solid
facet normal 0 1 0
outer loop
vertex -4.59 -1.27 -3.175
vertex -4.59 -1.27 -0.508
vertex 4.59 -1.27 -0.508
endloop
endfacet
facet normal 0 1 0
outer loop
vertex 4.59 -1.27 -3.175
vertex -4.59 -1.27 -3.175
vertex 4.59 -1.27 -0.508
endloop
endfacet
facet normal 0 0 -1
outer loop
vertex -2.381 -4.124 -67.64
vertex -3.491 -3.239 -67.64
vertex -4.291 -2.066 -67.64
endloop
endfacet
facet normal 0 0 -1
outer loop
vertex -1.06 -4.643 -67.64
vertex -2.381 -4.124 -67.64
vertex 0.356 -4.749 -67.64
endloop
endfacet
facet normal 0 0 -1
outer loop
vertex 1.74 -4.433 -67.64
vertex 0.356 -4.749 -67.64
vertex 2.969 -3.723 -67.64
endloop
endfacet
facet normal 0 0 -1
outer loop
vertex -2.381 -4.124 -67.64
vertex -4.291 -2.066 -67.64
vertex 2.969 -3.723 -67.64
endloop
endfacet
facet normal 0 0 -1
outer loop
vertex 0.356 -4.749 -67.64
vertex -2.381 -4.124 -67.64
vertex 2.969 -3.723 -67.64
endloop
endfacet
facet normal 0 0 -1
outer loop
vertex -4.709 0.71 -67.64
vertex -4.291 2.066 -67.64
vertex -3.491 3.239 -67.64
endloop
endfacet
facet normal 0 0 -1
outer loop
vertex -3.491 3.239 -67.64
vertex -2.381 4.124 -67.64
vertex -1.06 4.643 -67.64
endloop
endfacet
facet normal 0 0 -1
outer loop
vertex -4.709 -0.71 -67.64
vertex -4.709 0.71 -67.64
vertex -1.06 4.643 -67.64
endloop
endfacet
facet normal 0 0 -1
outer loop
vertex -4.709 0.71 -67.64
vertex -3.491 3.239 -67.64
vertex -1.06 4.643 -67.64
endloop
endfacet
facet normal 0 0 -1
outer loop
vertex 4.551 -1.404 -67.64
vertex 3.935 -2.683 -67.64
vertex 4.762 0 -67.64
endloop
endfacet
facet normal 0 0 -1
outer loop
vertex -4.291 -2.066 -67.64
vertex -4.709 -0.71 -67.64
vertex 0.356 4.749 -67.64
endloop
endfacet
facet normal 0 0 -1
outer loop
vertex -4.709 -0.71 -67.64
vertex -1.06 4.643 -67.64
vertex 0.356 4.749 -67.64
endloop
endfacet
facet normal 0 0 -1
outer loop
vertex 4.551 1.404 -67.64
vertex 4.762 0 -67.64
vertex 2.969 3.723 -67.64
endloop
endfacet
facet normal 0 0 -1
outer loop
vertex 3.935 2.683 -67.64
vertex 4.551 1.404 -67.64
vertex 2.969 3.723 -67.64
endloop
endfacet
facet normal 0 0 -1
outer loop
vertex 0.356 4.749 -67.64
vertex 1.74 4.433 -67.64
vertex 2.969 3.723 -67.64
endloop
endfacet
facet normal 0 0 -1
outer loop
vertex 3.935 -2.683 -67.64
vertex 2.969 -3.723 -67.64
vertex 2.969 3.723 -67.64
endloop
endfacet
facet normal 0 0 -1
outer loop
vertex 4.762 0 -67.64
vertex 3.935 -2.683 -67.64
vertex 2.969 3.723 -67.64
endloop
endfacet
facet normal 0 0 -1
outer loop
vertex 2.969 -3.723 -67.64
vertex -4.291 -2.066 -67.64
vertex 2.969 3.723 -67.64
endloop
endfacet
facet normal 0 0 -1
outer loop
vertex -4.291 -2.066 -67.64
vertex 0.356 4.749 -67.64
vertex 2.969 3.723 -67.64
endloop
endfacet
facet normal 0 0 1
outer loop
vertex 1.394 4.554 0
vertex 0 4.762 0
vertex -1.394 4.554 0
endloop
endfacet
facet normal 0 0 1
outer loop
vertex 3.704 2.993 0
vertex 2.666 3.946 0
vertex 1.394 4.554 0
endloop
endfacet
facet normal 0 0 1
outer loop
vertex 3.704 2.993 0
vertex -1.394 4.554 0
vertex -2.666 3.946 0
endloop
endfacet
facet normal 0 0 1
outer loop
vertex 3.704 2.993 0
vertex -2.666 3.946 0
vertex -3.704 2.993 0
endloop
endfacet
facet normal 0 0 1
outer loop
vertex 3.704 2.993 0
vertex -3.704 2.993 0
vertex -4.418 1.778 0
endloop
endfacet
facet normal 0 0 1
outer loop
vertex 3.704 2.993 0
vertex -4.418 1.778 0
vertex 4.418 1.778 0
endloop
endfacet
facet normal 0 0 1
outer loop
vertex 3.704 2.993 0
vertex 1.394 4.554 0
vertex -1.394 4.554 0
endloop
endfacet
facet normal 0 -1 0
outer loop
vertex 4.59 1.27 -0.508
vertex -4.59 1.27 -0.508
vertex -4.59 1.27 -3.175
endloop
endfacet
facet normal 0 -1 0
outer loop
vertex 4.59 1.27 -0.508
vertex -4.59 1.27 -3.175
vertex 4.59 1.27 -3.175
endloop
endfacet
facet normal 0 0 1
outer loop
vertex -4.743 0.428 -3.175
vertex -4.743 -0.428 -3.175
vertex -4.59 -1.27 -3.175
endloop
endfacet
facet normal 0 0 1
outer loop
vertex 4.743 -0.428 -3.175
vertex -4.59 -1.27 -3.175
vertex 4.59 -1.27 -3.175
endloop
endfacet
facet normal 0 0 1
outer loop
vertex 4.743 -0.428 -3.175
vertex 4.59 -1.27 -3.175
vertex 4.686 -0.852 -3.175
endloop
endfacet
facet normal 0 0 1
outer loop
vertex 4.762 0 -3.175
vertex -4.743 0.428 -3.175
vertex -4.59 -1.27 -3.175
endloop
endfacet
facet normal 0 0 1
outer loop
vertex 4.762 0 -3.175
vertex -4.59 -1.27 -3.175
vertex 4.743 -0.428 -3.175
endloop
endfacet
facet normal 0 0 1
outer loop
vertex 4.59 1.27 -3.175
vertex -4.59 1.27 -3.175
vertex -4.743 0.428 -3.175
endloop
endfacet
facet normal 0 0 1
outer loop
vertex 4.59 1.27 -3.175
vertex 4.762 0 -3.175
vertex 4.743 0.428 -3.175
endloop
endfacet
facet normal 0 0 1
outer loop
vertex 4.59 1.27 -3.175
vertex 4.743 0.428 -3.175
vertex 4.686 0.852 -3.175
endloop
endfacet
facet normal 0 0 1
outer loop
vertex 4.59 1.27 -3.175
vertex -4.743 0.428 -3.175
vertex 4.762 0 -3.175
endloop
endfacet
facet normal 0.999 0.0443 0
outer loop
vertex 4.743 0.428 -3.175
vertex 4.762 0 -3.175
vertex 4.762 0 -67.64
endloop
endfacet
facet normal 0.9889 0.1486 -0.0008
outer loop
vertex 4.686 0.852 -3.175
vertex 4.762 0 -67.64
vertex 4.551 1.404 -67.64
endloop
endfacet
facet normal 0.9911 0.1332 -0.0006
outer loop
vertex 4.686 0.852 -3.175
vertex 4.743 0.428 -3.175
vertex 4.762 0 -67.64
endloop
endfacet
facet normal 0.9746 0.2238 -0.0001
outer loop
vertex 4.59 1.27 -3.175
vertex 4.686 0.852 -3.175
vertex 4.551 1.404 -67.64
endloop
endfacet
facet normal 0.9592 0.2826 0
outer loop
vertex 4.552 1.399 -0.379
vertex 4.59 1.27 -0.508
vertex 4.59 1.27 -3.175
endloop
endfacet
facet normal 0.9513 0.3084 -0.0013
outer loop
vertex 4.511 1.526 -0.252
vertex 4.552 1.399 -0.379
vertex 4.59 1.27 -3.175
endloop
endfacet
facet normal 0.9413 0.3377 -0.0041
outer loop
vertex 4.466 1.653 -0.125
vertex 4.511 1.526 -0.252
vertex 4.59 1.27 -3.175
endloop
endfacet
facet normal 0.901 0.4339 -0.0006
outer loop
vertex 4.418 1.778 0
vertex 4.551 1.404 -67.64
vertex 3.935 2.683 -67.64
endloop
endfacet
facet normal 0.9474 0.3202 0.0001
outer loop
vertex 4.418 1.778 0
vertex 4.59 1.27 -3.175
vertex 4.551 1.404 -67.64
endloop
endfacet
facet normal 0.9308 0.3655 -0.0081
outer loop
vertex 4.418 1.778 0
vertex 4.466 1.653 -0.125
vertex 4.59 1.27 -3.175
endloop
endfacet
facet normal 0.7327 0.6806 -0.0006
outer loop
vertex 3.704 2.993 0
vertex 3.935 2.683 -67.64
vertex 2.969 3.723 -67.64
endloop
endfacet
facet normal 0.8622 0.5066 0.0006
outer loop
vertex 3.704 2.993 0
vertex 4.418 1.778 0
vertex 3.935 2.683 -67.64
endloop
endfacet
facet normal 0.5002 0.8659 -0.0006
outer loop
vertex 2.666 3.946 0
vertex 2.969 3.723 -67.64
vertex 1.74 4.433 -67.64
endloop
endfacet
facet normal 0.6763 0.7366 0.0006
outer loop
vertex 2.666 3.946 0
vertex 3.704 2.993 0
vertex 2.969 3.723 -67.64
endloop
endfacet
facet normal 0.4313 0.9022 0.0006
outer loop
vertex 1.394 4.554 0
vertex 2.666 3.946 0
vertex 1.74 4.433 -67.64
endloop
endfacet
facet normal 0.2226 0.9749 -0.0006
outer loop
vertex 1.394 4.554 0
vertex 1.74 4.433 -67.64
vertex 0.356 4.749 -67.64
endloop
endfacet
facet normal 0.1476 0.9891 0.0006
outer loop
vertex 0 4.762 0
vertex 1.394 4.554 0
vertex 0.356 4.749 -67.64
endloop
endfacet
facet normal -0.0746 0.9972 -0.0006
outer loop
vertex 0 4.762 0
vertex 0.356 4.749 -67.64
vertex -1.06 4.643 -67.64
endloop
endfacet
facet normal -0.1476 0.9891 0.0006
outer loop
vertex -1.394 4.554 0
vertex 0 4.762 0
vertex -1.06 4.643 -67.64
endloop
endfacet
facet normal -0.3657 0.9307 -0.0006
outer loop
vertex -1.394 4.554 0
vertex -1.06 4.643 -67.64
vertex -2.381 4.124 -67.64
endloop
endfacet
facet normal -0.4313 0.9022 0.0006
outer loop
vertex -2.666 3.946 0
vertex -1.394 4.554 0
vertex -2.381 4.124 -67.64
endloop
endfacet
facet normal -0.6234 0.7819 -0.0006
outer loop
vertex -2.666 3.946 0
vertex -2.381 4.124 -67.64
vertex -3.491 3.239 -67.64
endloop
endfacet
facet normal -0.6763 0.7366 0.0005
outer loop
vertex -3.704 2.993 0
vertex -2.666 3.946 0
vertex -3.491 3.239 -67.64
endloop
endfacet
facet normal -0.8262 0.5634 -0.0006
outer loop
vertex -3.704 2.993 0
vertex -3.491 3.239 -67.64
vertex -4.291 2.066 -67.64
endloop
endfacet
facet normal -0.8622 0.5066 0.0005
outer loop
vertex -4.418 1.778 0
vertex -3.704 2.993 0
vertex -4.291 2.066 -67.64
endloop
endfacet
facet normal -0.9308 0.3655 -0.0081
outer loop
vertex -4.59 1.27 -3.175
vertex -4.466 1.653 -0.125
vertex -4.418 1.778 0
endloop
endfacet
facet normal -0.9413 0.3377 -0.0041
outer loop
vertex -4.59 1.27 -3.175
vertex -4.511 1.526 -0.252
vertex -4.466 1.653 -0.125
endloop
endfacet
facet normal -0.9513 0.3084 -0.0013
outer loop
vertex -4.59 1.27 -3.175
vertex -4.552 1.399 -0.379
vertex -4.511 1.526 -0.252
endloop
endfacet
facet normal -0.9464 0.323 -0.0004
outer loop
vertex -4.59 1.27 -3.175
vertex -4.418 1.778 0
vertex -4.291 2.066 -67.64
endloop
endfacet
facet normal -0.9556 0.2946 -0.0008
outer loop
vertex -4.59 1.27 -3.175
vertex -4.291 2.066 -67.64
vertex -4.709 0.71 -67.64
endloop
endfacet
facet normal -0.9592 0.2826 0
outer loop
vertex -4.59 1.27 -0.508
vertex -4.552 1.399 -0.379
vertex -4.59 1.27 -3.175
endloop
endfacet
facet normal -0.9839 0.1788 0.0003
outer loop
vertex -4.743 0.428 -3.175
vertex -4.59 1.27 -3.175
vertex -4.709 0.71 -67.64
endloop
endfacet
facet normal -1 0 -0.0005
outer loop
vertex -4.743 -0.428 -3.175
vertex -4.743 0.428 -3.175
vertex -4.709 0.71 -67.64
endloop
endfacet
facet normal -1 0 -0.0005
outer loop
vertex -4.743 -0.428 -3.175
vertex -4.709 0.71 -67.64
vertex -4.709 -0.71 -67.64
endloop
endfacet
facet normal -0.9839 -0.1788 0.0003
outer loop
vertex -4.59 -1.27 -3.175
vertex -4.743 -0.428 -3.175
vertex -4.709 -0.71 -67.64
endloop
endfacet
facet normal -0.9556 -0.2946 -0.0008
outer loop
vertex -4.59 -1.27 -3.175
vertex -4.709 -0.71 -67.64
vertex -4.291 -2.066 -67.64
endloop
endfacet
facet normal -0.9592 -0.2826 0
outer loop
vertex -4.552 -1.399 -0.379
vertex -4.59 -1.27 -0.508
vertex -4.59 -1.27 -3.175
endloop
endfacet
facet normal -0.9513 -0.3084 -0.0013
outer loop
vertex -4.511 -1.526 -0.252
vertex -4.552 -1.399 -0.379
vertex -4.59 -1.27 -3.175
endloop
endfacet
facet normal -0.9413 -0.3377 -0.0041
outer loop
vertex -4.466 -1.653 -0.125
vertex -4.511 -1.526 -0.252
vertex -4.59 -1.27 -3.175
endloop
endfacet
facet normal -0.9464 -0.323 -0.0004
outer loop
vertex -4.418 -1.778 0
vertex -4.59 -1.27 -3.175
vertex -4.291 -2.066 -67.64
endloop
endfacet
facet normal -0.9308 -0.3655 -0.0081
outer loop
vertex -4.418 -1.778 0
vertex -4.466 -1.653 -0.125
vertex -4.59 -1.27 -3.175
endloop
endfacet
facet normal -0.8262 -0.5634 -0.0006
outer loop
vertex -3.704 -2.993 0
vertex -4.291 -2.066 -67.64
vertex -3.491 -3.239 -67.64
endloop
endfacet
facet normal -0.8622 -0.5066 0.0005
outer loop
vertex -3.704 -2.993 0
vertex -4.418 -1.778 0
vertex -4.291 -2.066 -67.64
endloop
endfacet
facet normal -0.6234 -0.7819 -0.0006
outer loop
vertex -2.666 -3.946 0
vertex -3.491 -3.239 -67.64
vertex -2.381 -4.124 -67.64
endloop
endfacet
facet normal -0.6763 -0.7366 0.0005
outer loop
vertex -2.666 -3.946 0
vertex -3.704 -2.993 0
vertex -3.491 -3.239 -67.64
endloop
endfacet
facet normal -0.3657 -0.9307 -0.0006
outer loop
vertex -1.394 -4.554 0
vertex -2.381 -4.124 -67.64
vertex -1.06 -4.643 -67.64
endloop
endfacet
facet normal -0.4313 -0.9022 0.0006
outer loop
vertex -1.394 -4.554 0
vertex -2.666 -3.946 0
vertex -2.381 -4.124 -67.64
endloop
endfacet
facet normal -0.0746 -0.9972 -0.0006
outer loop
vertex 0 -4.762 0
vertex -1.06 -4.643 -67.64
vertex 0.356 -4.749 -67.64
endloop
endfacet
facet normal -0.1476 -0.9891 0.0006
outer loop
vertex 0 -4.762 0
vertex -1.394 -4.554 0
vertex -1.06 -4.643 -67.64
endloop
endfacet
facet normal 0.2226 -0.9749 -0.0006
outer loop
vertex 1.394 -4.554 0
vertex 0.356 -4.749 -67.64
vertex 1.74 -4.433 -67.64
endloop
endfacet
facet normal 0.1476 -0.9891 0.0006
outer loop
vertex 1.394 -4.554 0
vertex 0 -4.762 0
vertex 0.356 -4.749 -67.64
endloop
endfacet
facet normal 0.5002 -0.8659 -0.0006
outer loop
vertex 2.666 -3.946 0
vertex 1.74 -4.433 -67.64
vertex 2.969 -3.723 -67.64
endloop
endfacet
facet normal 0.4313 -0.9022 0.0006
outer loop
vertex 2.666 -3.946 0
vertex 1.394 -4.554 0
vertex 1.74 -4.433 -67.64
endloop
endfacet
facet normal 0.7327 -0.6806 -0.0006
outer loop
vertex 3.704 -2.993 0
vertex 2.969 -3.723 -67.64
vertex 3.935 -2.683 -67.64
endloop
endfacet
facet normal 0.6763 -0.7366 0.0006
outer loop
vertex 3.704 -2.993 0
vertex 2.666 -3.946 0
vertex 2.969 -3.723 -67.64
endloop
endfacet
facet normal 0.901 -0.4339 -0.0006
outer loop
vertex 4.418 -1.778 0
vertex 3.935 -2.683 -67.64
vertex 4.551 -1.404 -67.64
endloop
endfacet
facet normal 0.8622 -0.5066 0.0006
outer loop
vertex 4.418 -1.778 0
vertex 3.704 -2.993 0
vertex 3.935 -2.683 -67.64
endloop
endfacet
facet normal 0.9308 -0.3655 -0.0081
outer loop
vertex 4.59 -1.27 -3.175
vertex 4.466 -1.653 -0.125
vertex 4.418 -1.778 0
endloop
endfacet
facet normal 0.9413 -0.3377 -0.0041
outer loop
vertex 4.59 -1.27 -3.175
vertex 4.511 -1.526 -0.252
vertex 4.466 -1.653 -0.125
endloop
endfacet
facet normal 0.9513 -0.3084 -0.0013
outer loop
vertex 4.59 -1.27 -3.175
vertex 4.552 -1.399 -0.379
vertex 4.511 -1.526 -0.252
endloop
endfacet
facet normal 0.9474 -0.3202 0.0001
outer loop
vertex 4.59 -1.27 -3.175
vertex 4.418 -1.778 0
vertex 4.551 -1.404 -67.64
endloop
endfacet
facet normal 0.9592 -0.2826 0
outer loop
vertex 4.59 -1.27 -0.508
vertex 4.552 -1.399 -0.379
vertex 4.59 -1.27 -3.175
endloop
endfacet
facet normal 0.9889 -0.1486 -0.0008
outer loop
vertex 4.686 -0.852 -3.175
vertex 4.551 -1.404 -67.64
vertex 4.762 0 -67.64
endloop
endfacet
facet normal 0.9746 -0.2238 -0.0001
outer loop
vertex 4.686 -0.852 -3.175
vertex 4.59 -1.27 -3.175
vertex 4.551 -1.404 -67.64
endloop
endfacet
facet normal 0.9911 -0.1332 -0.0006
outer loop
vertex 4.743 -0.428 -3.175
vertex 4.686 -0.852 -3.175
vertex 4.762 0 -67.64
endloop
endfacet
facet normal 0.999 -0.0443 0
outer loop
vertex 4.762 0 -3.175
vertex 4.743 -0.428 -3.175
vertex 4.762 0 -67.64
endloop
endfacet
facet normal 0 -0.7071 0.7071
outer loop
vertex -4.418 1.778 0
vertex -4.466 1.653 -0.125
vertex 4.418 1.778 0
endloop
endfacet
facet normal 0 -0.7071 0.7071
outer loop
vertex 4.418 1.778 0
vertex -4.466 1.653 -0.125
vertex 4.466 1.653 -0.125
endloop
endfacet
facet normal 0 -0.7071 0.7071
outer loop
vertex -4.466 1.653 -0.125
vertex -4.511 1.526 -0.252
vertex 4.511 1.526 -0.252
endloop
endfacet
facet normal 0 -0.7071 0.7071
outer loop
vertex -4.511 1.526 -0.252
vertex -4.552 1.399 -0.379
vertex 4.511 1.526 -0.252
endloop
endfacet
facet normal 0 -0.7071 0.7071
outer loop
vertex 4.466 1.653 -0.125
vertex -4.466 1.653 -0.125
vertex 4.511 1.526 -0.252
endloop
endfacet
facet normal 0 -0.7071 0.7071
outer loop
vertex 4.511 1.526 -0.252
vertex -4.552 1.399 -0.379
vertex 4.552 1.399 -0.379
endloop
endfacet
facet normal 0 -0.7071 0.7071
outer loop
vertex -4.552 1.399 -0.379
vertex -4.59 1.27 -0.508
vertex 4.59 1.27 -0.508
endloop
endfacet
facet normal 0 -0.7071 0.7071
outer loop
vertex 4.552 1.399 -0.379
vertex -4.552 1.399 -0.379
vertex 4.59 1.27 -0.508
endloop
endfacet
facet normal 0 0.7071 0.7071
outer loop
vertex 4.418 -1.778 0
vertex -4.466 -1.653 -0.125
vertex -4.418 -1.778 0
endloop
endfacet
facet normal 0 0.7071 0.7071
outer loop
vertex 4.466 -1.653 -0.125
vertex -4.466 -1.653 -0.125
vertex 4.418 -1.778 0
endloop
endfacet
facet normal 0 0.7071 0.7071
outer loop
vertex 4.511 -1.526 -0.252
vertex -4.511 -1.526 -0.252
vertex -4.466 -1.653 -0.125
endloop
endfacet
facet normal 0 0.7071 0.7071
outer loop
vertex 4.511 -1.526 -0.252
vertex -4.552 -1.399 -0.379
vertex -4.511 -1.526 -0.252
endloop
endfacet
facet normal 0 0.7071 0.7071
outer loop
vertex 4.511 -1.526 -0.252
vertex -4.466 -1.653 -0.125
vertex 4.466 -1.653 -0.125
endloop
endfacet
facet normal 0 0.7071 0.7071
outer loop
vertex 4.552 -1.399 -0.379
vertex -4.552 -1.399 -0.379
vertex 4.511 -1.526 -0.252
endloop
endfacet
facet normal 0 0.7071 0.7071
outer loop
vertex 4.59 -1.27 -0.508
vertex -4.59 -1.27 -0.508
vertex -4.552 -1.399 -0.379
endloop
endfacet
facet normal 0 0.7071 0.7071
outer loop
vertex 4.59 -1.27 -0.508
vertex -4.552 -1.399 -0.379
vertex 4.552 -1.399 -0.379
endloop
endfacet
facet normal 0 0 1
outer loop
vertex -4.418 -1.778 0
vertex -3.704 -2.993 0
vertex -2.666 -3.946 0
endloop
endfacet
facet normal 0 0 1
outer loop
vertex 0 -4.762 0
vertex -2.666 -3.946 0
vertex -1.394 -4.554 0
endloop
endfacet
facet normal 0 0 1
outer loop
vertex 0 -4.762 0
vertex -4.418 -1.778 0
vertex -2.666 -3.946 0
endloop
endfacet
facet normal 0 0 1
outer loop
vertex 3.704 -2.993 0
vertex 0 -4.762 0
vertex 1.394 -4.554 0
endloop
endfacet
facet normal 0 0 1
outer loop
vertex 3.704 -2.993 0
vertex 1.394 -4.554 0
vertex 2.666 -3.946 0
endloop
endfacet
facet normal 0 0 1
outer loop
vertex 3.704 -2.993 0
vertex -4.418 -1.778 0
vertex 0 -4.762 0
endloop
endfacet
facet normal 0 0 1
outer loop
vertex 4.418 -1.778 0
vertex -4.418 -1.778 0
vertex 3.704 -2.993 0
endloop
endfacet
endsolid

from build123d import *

# Parameters (mm, degrees)
SKETCH1_R           = 4.7625
BOSS_EXTRUDE1_DEPTH = 67.6402
SKETCH2_W           = 9.525
SKETCH2_H           = 2.54
CUT_EXTRUDE1_DEPTH  = 3.175
CHAMFER1_SIZE       = 0.508


with BuildPart() as part:
    # Sketch1 → Boss-Extrude1 (new body)
    with BuildSketch(Plane.XY):
        Circle(SKETCH1_R)
    extrude(amount=-BOSS_EXTRUDE1_DEPTH)

    # Sketch2 → Cut-Extrude1 (cut)
    with BuildSketch(Plane.XY):
        Rectangle(SKETCH2_W, SKETCH2_H)
    extrude(amount=-CUT_EXTRUDE1_DEPTH, mode=Mode.SUBTRACT)

    # Chamfer1
    chamfer1_edges = [part.edges().sort_by_distance(p)[0] for p in [
        (0, -1.27, 0),
        (0, 1.27, 0),
    ]]
    chamfer(chamfer1_edges, length=CHAMFER1_SIZE)


solid = part.part
